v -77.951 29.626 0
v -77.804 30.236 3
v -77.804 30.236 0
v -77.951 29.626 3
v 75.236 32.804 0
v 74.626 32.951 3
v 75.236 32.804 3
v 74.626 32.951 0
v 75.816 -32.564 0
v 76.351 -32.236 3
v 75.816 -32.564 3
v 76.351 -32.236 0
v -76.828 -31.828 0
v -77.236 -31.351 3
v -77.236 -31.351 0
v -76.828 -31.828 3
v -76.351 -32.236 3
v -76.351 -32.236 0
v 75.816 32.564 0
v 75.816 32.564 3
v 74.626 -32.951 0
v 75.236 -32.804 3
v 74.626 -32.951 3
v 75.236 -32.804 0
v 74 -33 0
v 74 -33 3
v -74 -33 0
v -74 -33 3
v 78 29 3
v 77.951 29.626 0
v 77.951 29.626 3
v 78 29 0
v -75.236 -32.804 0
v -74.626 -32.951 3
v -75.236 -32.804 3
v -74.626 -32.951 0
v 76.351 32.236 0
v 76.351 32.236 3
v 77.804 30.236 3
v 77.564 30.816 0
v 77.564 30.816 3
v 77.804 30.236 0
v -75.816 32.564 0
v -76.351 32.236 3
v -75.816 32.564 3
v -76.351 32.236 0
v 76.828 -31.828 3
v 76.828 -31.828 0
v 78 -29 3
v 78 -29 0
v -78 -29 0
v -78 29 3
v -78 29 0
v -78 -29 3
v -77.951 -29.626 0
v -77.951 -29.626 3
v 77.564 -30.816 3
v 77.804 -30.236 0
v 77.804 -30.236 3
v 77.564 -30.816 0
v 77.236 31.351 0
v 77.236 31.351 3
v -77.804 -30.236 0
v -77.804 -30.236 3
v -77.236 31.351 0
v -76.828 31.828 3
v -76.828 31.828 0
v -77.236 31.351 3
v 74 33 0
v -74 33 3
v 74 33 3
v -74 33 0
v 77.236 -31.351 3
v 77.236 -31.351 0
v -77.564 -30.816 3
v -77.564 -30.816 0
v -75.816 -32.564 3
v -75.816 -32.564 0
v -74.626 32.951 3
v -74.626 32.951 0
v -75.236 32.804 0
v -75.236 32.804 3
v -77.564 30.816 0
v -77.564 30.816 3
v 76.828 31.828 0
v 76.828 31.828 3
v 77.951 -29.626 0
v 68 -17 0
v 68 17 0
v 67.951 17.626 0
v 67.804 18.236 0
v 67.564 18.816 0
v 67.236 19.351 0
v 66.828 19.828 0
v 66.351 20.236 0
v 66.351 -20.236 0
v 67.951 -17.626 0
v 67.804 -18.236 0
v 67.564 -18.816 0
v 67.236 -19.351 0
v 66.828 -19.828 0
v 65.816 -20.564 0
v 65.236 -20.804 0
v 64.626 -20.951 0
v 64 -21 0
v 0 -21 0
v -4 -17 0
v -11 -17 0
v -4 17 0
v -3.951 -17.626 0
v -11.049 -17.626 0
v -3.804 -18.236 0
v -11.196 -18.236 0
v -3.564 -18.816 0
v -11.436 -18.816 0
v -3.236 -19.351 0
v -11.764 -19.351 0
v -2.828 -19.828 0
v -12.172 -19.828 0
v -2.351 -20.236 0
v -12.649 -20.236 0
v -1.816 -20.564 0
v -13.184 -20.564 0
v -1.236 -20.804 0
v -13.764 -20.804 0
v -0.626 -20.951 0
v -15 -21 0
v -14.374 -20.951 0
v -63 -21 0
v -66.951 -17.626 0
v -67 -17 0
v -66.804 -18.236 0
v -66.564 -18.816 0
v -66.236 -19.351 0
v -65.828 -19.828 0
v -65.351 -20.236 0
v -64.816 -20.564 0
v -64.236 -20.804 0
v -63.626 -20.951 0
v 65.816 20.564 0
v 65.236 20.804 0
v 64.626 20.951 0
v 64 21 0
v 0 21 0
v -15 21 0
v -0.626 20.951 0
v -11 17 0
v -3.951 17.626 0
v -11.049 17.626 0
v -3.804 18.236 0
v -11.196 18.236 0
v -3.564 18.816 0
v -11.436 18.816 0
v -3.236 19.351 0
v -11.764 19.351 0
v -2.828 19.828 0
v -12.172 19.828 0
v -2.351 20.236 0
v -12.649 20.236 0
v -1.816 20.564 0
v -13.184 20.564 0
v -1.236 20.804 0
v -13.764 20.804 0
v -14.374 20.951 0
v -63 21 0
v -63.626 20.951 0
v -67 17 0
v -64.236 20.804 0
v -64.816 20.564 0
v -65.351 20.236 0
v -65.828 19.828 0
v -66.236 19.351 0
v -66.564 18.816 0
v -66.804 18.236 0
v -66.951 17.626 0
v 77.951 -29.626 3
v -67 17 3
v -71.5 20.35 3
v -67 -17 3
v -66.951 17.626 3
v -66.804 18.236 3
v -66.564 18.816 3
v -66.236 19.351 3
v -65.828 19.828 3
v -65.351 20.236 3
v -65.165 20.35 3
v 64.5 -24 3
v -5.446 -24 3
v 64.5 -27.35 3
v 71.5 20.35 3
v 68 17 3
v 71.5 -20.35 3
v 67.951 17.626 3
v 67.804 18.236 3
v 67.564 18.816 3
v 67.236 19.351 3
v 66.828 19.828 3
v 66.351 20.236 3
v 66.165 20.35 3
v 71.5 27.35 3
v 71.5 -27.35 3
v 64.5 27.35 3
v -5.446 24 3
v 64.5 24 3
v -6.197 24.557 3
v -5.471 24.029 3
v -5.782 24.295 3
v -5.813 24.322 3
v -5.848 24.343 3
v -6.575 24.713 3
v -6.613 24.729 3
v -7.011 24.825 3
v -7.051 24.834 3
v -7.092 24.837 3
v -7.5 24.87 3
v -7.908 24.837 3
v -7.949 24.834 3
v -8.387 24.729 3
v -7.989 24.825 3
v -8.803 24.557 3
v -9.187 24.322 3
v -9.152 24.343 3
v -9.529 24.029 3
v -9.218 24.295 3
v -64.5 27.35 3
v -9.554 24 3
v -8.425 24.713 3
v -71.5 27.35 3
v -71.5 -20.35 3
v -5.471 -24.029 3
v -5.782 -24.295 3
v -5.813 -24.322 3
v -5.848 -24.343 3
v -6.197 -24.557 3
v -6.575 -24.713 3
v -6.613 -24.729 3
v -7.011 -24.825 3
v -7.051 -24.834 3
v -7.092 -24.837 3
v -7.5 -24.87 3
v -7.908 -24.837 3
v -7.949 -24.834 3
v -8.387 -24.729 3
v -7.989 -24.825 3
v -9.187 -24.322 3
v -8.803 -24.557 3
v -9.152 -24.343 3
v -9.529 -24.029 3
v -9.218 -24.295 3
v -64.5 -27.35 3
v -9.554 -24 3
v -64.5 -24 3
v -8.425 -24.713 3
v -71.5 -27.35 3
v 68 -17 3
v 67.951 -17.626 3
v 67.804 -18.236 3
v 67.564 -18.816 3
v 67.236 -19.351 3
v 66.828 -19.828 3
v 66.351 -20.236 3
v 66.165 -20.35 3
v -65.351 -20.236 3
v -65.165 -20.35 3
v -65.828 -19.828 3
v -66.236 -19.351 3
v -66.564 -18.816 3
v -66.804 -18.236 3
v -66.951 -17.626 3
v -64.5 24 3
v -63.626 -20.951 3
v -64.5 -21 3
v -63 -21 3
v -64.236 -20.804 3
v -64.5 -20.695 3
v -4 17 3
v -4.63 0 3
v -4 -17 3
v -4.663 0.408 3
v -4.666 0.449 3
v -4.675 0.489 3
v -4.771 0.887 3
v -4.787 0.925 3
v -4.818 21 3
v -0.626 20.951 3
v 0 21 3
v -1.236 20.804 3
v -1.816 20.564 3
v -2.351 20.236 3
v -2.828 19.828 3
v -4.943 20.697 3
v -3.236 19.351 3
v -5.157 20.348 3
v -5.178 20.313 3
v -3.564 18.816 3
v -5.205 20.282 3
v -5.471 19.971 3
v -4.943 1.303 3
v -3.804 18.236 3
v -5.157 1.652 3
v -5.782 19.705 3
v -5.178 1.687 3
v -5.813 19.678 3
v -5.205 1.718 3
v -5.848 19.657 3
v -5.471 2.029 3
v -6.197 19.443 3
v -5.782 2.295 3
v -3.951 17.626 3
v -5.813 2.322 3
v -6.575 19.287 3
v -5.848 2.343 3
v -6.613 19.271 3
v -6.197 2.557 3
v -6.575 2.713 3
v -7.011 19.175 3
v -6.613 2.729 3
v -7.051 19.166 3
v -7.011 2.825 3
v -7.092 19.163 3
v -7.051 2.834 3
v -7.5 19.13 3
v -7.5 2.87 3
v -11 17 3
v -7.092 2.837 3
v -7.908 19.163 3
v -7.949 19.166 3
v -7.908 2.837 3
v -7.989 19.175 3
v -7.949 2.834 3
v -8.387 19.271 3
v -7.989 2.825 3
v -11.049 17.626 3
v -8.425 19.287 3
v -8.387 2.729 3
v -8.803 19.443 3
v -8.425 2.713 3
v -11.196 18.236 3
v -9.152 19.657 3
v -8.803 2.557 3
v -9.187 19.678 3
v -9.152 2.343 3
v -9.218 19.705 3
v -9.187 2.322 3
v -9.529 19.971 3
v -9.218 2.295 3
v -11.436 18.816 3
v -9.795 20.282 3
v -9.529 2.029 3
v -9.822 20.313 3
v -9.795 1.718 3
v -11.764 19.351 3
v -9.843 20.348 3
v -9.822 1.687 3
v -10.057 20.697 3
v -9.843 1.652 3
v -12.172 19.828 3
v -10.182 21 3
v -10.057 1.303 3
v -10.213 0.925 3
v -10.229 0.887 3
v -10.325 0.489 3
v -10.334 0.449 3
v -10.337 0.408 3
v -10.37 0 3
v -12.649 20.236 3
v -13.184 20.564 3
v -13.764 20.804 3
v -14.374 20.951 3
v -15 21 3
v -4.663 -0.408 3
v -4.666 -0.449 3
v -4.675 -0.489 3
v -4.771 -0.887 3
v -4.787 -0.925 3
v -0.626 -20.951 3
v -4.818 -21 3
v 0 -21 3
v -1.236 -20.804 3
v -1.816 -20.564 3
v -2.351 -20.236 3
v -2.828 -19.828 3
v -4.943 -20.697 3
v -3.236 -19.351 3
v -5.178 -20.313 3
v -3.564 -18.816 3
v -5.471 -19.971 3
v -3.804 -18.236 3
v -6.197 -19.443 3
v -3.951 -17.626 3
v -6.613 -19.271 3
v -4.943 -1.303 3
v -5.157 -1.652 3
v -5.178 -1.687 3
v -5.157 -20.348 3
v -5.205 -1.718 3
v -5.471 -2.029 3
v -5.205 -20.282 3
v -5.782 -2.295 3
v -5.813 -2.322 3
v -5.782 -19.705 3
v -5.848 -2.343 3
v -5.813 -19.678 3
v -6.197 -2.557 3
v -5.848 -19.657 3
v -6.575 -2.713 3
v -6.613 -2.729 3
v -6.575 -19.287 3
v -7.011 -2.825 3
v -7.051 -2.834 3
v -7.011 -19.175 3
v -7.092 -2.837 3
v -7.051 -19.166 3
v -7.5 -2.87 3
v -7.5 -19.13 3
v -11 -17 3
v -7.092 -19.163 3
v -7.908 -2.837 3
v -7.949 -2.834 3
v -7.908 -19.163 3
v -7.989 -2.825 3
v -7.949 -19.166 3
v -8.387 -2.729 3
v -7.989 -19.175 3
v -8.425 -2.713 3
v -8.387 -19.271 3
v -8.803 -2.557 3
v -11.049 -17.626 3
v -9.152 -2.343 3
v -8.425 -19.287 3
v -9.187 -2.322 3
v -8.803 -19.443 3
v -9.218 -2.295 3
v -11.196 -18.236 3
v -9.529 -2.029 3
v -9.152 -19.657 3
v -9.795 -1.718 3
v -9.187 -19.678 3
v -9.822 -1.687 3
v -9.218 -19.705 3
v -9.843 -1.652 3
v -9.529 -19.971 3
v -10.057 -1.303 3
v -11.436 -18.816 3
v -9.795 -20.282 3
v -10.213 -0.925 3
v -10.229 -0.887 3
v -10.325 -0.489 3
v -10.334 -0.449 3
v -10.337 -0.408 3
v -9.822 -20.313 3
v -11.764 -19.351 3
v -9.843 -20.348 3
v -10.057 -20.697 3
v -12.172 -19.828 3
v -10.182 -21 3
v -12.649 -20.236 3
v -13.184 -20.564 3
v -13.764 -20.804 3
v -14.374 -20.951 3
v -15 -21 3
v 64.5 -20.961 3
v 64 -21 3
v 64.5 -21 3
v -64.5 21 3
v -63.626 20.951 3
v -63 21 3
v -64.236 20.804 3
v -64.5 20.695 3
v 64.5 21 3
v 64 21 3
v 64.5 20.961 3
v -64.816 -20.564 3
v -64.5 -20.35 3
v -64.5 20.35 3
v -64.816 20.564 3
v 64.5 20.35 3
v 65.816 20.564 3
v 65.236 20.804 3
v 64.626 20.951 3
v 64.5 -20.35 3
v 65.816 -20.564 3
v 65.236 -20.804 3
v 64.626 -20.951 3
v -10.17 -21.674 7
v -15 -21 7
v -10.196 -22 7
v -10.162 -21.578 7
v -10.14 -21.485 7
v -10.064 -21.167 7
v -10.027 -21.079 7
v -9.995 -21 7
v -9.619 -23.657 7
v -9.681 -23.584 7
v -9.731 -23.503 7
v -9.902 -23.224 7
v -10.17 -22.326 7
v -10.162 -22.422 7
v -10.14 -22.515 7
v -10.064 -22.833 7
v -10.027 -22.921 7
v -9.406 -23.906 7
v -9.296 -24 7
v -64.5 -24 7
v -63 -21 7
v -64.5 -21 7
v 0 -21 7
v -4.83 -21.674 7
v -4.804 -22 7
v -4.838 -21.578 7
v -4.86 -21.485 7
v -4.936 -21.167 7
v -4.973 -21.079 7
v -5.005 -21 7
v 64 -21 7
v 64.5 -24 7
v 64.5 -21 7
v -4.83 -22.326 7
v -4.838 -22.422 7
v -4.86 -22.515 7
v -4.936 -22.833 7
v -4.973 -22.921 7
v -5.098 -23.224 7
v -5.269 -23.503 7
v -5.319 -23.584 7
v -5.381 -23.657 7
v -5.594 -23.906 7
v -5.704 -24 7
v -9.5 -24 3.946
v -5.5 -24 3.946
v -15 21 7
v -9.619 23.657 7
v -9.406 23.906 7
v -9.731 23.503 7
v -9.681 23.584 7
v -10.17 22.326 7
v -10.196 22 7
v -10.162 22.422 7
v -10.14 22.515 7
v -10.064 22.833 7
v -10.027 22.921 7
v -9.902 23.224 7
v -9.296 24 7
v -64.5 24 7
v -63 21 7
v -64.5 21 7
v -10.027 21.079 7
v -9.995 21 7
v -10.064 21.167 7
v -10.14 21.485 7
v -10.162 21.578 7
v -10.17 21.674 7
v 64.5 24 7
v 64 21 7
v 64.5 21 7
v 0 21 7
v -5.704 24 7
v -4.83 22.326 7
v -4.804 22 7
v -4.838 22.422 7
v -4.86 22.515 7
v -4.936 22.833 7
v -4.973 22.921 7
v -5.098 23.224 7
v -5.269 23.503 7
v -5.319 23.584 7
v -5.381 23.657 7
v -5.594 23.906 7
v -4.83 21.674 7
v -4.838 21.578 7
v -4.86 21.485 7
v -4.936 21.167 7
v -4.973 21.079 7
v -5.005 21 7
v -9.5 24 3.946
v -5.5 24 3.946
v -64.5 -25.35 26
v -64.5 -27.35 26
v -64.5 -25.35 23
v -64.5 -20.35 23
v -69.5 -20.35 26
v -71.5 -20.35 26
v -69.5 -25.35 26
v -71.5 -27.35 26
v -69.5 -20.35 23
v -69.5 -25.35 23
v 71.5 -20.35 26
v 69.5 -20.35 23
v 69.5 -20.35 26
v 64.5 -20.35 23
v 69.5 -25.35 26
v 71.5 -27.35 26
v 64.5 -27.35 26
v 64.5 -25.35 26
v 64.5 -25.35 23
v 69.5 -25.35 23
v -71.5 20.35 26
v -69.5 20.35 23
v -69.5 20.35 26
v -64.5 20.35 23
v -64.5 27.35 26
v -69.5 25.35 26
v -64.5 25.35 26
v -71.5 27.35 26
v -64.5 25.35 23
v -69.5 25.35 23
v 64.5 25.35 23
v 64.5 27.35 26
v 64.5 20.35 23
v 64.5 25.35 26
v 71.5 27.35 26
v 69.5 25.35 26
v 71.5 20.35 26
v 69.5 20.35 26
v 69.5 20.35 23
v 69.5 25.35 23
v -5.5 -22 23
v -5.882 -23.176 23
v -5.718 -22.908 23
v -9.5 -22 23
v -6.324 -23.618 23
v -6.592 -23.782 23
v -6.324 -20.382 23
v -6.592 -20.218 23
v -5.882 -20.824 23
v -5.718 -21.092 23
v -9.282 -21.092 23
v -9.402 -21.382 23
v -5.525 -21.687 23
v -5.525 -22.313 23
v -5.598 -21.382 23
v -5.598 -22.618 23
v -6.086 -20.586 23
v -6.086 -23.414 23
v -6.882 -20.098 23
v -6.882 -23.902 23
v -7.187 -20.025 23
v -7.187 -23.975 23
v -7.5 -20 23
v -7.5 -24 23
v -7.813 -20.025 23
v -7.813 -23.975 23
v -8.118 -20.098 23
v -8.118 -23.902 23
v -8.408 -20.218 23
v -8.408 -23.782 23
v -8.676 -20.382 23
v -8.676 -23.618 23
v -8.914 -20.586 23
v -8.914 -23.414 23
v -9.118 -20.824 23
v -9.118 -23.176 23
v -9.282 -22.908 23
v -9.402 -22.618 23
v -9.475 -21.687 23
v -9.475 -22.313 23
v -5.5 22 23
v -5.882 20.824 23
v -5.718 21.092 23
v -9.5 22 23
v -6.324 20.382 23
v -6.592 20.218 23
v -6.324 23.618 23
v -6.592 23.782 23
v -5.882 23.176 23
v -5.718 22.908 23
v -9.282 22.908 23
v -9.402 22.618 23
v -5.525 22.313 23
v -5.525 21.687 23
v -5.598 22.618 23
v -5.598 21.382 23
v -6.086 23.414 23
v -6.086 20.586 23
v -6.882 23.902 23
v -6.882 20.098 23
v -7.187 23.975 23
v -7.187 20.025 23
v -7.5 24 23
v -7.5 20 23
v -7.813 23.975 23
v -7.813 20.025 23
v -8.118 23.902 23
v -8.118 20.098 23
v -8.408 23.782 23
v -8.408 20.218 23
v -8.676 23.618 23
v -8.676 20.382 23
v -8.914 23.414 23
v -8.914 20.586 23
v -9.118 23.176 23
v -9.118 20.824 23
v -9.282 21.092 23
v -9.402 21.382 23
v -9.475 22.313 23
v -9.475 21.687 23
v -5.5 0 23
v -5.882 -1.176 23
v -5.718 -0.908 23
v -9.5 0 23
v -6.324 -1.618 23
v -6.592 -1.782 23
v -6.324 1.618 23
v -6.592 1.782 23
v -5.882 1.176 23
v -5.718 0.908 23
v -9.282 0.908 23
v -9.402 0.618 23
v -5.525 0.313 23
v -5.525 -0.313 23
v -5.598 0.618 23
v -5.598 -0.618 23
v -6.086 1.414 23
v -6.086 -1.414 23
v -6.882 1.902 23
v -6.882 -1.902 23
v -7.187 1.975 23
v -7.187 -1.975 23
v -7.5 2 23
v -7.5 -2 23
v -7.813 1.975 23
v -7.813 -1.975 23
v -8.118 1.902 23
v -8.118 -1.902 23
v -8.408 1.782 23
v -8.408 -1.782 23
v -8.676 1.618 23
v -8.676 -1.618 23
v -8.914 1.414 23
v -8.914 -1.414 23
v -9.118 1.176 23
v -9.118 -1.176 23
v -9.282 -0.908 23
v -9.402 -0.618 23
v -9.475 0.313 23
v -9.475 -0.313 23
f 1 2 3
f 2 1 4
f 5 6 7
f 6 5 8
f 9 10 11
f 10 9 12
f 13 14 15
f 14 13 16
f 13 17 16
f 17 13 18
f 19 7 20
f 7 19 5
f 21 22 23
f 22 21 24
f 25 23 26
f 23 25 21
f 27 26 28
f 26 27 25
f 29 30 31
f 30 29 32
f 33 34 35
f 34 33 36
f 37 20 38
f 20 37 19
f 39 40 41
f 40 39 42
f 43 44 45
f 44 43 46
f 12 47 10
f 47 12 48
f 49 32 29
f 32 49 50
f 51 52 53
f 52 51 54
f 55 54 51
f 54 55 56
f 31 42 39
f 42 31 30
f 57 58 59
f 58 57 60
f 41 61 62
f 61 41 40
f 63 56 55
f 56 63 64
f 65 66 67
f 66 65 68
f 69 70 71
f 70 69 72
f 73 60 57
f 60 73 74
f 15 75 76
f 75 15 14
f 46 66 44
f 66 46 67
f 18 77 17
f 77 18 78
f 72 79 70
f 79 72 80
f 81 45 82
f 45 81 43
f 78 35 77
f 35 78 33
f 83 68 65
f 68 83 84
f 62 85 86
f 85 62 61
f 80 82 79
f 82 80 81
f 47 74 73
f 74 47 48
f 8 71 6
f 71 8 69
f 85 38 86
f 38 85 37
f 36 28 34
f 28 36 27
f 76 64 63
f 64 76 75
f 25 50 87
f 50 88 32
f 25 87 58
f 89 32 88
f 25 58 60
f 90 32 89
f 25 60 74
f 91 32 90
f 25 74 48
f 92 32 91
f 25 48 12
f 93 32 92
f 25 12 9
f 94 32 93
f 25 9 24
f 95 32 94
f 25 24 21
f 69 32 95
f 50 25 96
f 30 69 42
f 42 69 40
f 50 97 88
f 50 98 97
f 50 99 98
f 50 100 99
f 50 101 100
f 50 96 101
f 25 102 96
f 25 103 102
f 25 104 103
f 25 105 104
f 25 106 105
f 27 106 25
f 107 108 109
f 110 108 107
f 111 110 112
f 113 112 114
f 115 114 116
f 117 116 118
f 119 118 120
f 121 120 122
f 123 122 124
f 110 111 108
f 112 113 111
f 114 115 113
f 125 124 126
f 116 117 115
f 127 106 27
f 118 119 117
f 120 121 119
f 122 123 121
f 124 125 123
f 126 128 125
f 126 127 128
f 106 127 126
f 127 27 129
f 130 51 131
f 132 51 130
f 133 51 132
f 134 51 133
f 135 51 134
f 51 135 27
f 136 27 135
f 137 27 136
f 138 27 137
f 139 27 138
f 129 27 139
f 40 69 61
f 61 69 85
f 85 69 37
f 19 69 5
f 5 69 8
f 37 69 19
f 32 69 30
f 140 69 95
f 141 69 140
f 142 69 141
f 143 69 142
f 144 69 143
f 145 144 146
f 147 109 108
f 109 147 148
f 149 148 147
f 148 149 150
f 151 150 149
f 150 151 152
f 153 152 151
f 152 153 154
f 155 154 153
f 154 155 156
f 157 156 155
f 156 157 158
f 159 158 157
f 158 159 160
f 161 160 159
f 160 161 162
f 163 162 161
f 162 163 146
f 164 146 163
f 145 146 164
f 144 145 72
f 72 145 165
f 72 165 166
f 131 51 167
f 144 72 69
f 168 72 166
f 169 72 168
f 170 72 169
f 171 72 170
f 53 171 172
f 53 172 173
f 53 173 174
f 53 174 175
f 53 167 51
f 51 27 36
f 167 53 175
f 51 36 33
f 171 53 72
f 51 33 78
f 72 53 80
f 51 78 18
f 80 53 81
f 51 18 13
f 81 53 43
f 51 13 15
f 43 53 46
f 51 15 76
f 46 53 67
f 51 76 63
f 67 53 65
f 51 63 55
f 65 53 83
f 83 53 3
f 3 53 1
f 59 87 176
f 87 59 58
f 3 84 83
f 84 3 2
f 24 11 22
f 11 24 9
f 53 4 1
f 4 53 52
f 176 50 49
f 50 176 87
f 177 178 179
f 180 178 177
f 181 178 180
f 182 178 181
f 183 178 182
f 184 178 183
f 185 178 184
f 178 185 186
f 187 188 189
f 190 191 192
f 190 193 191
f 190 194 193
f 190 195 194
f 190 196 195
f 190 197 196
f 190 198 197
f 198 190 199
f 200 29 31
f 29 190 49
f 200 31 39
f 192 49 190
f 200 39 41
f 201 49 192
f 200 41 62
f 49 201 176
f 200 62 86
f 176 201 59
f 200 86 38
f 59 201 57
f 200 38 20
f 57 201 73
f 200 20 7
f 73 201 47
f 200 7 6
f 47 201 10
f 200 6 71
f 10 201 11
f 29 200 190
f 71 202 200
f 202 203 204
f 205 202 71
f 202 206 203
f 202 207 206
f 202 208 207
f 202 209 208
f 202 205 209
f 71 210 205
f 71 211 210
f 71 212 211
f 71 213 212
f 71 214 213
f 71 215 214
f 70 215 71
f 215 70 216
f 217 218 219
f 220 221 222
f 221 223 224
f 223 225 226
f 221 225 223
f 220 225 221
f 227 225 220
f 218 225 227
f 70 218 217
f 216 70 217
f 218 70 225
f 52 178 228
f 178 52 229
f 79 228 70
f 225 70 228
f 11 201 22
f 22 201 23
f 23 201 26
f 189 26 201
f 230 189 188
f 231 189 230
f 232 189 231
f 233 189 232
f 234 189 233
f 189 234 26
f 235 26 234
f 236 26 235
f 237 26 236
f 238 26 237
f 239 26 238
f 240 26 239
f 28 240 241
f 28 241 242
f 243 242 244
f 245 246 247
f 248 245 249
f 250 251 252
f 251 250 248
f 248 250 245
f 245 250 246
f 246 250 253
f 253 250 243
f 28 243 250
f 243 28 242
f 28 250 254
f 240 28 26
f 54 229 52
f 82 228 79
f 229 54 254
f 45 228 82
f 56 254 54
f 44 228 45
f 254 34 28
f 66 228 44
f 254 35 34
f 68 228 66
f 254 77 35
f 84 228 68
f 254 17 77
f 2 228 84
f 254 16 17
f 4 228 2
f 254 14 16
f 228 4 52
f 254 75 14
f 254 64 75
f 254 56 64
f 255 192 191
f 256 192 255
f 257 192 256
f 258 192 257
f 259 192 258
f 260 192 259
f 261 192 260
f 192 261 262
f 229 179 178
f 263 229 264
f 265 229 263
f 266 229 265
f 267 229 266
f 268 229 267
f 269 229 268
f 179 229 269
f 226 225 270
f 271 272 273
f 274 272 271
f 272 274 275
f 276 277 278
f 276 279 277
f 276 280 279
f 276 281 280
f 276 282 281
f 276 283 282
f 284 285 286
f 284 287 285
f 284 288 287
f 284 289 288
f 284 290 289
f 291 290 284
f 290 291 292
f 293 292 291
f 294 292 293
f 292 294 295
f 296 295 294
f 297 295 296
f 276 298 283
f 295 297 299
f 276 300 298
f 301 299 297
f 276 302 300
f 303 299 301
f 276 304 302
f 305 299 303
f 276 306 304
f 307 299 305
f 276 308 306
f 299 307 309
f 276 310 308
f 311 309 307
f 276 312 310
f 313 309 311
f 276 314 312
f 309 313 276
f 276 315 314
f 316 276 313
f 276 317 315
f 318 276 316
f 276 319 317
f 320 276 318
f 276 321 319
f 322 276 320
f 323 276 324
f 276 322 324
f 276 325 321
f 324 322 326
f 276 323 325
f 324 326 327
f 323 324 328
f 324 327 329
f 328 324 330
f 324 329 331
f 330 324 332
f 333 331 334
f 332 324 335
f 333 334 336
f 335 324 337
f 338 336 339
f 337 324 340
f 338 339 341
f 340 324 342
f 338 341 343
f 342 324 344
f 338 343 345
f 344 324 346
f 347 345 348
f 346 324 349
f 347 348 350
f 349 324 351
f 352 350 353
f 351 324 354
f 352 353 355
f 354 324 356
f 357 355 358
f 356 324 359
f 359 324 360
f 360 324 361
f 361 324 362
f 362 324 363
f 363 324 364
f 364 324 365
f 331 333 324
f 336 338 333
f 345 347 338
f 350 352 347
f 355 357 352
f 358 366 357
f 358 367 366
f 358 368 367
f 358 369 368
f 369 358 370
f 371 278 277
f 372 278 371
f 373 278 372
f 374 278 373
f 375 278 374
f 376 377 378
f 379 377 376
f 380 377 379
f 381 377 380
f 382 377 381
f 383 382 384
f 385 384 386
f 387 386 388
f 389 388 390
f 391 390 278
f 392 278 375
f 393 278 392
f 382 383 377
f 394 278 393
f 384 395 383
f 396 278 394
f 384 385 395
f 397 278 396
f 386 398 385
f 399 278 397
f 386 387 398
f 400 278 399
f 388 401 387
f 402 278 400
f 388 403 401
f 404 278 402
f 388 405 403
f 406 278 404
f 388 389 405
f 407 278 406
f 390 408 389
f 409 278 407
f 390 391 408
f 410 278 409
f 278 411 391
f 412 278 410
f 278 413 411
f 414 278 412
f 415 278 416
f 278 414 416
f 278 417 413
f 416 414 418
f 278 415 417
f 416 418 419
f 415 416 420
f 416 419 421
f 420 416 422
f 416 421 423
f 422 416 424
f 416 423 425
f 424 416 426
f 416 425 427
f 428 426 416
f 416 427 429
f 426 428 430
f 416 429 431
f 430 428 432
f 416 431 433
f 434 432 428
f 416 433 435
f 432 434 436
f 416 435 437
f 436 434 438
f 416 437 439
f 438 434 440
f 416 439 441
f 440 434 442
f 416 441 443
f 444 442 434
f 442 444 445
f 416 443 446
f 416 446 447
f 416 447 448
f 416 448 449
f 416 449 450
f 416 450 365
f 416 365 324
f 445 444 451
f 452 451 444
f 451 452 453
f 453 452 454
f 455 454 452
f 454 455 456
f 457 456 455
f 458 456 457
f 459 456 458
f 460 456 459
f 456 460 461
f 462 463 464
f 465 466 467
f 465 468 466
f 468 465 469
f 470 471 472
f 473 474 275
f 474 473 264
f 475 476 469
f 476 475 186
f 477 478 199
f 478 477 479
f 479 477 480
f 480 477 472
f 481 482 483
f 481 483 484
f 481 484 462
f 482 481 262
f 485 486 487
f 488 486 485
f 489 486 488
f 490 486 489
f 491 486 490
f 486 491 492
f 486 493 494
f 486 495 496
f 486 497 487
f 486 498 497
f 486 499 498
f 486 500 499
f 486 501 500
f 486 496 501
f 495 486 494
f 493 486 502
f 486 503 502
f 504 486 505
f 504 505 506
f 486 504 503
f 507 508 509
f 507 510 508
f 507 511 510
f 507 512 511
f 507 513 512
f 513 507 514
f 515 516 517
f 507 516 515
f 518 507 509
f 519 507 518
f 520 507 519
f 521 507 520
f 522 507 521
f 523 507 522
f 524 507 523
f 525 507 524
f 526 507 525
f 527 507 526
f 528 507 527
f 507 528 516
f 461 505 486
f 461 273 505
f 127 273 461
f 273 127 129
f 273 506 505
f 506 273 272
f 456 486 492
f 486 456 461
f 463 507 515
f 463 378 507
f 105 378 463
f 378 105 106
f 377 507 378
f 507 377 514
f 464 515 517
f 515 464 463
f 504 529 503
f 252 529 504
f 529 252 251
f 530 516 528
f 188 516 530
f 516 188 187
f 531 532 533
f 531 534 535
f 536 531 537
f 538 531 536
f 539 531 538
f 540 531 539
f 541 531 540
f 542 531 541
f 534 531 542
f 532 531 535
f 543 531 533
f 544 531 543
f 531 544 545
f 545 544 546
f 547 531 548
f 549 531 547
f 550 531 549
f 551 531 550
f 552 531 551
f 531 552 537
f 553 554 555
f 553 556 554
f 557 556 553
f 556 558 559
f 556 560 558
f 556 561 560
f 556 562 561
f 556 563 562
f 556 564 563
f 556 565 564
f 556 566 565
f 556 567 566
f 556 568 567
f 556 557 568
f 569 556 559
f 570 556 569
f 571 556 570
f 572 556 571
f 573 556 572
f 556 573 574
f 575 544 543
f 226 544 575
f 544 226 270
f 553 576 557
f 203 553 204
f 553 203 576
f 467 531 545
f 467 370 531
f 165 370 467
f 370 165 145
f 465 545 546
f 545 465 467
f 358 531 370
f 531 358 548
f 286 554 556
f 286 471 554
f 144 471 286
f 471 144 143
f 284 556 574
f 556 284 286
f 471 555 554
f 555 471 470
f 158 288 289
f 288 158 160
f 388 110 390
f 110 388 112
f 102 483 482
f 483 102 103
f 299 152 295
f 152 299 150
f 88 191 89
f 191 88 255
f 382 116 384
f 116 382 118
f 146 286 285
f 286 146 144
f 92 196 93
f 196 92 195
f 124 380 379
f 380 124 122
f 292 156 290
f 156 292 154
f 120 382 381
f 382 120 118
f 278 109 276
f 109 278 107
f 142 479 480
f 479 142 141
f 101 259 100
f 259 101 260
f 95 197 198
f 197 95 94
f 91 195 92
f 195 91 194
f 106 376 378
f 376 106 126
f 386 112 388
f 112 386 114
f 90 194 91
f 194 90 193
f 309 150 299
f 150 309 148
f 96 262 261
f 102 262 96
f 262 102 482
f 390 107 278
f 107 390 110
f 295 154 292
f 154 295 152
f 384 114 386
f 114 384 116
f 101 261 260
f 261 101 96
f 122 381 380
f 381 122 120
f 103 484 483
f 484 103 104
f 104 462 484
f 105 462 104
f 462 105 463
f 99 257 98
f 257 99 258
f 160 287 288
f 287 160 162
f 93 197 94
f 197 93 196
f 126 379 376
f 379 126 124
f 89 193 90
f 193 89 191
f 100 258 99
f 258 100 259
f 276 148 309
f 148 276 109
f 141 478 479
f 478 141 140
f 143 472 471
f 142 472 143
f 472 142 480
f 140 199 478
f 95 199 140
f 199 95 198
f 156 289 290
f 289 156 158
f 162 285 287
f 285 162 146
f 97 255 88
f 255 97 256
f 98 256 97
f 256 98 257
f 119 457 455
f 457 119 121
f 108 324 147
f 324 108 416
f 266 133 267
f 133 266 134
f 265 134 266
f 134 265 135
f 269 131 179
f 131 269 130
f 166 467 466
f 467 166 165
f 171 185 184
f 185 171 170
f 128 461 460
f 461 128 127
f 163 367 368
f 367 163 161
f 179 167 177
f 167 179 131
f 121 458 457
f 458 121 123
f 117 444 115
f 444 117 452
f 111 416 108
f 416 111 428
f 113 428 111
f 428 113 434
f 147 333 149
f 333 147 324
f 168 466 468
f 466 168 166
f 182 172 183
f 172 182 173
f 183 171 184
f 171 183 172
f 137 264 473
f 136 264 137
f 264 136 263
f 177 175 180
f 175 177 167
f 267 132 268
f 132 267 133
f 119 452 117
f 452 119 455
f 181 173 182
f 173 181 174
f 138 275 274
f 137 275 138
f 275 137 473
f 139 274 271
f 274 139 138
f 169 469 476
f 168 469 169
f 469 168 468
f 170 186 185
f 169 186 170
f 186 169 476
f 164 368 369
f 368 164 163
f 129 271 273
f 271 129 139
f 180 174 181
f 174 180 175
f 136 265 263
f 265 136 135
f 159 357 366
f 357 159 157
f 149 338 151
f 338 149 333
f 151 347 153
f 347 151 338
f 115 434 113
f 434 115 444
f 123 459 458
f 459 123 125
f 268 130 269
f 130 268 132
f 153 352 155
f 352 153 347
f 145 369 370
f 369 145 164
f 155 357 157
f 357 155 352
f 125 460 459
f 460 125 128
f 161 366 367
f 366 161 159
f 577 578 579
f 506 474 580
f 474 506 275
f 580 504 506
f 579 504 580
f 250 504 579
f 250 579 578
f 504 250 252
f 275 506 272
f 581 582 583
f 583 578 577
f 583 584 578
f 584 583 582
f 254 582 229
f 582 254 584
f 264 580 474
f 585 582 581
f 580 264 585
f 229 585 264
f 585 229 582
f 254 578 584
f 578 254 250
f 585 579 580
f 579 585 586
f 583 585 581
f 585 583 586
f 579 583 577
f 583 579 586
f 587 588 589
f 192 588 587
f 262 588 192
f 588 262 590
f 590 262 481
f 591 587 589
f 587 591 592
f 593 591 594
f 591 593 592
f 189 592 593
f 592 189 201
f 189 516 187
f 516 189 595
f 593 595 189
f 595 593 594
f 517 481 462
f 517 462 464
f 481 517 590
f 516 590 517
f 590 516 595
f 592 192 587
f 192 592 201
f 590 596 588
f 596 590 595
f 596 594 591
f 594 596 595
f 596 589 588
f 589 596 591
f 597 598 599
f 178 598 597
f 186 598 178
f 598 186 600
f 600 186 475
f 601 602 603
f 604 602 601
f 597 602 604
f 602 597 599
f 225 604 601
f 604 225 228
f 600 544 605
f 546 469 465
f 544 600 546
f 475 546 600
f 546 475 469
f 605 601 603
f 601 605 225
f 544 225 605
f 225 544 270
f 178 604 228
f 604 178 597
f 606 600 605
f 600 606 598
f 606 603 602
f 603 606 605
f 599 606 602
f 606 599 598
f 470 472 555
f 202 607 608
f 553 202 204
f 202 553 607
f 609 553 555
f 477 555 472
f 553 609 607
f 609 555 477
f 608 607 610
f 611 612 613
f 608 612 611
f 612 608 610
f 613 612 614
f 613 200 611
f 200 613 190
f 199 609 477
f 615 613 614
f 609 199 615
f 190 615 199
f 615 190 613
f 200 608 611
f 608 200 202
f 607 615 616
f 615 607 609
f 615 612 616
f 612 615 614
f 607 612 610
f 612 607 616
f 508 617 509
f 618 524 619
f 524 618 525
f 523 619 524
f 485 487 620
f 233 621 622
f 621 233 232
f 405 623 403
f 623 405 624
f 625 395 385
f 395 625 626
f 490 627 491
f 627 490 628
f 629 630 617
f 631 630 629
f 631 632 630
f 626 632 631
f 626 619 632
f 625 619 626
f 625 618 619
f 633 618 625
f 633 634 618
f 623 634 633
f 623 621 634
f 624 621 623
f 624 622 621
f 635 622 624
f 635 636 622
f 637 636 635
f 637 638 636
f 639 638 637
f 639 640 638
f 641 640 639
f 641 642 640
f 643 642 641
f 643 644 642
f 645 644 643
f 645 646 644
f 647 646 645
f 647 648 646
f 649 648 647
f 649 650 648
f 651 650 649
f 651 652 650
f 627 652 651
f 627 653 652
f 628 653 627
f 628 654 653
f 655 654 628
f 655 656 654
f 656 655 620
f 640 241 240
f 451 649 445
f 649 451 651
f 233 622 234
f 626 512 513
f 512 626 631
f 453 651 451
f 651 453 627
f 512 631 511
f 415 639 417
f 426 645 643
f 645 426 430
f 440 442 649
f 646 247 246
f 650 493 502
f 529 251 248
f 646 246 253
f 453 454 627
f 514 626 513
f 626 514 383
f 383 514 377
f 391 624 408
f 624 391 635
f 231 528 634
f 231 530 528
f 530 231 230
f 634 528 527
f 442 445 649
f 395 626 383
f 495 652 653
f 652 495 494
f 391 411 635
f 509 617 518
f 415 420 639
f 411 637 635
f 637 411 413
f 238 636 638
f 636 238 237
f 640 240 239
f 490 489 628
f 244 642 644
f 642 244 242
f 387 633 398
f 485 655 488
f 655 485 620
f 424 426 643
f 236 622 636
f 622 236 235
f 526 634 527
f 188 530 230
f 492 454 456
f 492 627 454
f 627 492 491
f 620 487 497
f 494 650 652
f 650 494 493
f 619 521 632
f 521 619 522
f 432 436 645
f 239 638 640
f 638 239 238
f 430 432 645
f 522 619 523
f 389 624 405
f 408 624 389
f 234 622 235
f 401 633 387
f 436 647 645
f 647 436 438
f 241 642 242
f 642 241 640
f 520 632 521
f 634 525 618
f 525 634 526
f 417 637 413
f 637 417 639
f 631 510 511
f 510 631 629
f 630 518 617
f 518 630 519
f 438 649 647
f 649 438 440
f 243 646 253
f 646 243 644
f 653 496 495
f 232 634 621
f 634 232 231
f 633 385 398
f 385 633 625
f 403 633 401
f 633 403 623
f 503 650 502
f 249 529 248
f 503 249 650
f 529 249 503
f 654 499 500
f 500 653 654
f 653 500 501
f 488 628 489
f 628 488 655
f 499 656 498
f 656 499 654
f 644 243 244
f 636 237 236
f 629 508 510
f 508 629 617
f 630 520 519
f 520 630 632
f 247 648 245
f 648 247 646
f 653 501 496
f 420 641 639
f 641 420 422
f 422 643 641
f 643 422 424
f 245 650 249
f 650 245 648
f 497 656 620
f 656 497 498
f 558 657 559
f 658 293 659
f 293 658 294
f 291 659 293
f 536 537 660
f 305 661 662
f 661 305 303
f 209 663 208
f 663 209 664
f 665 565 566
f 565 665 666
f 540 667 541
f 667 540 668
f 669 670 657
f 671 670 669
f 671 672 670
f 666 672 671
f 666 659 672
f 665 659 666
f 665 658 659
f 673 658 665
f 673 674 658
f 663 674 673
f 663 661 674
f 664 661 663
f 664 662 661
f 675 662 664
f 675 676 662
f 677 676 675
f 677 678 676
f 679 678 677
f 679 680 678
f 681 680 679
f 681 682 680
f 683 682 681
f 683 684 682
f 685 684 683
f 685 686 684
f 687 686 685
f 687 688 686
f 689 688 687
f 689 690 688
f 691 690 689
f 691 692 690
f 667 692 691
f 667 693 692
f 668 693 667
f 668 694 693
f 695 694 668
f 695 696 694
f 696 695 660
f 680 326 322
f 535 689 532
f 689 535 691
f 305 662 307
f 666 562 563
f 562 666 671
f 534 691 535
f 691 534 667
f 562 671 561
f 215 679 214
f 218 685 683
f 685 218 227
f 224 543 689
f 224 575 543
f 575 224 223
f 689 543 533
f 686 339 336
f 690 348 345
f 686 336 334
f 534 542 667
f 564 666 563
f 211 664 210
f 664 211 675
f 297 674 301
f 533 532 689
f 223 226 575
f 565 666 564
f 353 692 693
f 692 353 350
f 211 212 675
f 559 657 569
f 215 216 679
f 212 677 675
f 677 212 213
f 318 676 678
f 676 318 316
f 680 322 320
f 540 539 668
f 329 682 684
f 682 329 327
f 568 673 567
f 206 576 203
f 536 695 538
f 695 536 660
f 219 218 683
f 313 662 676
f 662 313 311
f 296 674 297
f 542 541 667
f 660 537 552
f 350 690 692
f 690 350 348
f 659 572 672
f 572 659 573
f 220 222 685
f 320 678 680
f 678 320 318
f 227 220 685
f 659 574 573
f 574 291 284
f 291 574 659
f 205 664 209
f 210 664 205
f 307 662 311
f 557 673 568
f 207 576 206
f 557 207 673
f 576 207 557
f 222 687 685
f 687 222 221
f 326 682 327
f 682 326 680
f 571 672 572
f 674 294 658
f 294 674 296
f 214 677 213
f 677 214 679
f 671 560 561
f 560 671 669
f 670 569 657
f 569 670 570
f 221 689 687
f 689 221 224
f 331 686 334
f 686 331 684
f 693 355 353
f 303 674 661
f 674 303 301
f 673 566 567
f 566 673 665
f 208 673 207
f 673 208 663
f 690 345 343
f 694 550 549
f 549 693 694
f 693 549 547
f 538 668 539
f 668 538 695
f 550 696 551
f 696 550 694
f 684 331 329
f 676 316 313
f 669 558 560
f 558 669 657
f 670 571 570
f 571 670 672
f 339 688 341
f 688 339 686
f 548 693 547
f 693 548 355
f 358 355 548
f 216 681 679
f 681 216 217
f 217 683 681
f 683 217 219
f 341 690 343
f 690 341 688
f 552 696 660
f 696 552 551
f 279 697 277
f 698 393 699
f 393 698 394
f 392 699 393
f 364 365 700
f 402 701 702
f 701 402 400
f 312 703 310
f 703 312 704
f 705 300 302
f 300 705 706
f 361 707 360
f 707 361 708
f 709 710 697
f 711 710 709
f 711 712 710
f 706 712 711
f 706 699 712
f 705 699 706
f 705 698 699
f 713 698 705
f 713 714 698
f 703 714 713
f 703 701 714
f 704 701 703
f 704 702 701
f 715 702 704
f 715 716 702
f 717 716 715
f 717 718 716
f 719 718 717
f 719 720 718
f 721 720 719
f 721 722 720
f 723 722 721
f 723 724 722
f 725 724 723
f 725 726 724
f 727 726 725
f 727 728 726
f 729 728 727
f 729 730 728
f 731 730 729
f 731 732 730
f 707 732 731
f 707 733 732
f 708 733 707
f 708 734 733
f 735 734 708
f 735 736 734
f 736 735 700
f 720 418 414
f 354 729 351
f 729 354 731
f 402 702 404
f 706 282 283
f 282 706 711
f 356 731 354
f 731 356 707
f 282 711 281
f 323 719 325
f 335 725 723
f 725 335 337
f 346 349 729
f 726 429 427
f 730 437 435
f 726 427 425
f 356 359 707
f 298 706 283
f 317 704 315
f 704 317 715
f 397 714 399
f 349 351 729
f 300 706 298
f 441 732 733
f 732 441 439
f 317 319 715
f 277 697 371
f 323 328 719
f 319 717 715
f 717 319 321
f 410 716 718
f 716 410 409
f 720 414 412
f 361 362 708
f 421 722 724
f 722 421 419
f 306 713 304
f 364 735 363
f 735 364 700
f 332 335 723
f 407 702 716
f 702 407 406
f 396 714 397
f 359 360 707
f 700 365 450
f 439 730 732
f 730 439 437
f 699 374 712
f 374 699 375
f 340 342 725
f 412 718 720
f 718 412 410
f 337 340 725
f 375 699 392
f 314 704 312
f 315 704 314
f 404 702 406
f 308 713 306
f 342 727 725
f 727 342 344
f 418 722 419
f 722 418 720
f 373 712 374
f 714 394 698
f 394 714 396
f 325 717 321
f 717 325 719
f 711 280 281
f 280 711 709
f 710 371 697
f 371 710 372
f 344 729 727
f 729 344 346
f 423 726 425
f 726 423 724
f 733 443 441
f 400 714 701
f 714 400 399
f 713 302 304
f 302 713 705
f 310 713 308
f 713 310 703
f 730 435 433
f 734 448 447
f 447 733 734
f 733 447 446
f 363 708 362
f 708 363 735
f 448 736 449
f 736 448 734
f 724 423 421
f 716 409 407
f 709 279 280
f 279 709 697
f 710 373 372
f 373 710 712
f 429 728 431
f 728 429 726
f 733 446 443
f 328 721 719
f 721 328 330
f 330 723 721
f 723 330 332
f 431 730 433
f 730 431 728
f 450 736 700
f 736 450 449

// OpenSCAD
/* File: ~/GliderWinchItems/BMS/hw/openscad/pcb-frame3.scad
  * frame for working on BMS pc board
  * Latest edit: 20220815
 */
 
 $fn=40;
  
module rounded_rectangle_hull(wid,slen,ht,rad)
{
 hull()
 {    
    translate([-wid/2+rad,rad,0])
        cylinder(r=rad,h=ht,center=false);

   translate([ wid/2-rad,rad,0])
        cylinder(r=rad,h=ht,center=false);

    translate([-wid/2+rad,slen-rad,0])
        cylinder(r=rad,h=ht,center=false);
    
    translate([ wid/2-rad,slen-rad,0])
        cylinder(r=rad,h=ht,center=false);
 }
}
brdwid = 50-0.0;
brdlen = 140-0.0;
brdholdx = 134.0-2.0;
brdholdmx = brdlen/2 - 58.0+3.0;
brdholdy = 44;
brdholdmy = brdholdy/2 - 22;
brdholdia = 3.5;

basethk = 3;
baserim = 8;
baserad = 4;

crnr = 4;
   ll = baserim*2 + brdlen;
    ww = baserim*2 + brdwid;

module base()
{
 
    difference()
    {
        union()
        {
            translate([0,-ww/2,0])
            rounded_rectangle_hull(ll,ww,basethk,baserad);
            
            // Lip to strengthen cable connect end of pcb
            uu=136;
            translate([-uu/2,-brdwid/2+1,basethk])
            cube([uu,3,4],center=false);
            translate([-uu/2,brdwid/2-4,basethk])
            cube([uu,3,4],center=false);
      
        }
        union()
        {
            // punch out rectangle below pcb
            lll = brdlen/2 - baserim*2+2;
            www = brdwid - baserim;
            translate([lll/2+4,-www/2,-0.01])
            rounded_rectangle_hull(lll+16,www,basethk+10,baserad);
            
            translate([-lll/2-11,-www/2,-0.01])
            rounded_rectangle_hull(lll,www,basethk+10,baserad);            

  //          translate([-brdlen/2+dd/2,-brdwid/2+dd/2,-0.01])
//                 cube([brdlen-dd,brdwid-dd,50],center=false);
            
            // JIC base mounting holes
 /*           translate([-ll/2+4,-ww/2+4,0])cylinder(d=3.0,h=50,center=false);
            translate([-ll/2+4,+ww/2-4,0])cylinder(d=3.0,h=50,center=false);
            translate([+ll/2-4,-ww/2+4,0])cylinder(d=3.0,h=50,center=false);
            translate([+ll/2-4,+ww/2-4,0])cylinder(d=3.0,h=50,center=false);    
*/            
        }
    }
}
// Mounting post and holes for pcb
module post(a)
{
    jj = basethk+12+8;
    translate(a)
    { difference()
        {
            union()
            {
                translate([0,0,jj/2])
                cylinder(d1=crnr+2,d2=crnr,h=jj,center=true);
         }
            union()
            {
            }
        }
    }
}
module postsq(s,v)
{
    jj = basethk+12+8;
hy = 7;
hz = 20;
lip = 3;
lw = 2;
    translate(s)
    rotate(v)
    { difference()
        {
            union()
            {
                translate([0,0,jj/2+lip])
                cube([hy,hy,jj],center=true);           
            }
            union()
            {
                translate([lw+hz/2-hy/2,lw+hz/2-hy/2,(jj+lip)+24/2-lip])
                cube([hz,hz,24],center=true);
            }
        }
    }
}
module total()
{
xx = 0; // Hole centering adjustment    
    base();
    
    translate([0,0,0])
    {
cc = (141-5)/2;
bb = (51-3.3)/2;        
    postsq([-cc,-bb,0],[0,0, 0]);
    postsq([+cc,-bb,0],[0,0, 90]);
    postsq([-cc,+bb,0],[0,0,-90]);
    postsq([+cc,+bb,0],[0,0,180]);
        kk=0;
    post([-brdholdmx/2+kk,-brdholdy/2,0]);
    post([-brdholdmx/2+kk,+brdholdy/2,0]);       
    post([-brdholdmx/2+kk,+brdholdmy/2,0]);        
    }
}

total();
